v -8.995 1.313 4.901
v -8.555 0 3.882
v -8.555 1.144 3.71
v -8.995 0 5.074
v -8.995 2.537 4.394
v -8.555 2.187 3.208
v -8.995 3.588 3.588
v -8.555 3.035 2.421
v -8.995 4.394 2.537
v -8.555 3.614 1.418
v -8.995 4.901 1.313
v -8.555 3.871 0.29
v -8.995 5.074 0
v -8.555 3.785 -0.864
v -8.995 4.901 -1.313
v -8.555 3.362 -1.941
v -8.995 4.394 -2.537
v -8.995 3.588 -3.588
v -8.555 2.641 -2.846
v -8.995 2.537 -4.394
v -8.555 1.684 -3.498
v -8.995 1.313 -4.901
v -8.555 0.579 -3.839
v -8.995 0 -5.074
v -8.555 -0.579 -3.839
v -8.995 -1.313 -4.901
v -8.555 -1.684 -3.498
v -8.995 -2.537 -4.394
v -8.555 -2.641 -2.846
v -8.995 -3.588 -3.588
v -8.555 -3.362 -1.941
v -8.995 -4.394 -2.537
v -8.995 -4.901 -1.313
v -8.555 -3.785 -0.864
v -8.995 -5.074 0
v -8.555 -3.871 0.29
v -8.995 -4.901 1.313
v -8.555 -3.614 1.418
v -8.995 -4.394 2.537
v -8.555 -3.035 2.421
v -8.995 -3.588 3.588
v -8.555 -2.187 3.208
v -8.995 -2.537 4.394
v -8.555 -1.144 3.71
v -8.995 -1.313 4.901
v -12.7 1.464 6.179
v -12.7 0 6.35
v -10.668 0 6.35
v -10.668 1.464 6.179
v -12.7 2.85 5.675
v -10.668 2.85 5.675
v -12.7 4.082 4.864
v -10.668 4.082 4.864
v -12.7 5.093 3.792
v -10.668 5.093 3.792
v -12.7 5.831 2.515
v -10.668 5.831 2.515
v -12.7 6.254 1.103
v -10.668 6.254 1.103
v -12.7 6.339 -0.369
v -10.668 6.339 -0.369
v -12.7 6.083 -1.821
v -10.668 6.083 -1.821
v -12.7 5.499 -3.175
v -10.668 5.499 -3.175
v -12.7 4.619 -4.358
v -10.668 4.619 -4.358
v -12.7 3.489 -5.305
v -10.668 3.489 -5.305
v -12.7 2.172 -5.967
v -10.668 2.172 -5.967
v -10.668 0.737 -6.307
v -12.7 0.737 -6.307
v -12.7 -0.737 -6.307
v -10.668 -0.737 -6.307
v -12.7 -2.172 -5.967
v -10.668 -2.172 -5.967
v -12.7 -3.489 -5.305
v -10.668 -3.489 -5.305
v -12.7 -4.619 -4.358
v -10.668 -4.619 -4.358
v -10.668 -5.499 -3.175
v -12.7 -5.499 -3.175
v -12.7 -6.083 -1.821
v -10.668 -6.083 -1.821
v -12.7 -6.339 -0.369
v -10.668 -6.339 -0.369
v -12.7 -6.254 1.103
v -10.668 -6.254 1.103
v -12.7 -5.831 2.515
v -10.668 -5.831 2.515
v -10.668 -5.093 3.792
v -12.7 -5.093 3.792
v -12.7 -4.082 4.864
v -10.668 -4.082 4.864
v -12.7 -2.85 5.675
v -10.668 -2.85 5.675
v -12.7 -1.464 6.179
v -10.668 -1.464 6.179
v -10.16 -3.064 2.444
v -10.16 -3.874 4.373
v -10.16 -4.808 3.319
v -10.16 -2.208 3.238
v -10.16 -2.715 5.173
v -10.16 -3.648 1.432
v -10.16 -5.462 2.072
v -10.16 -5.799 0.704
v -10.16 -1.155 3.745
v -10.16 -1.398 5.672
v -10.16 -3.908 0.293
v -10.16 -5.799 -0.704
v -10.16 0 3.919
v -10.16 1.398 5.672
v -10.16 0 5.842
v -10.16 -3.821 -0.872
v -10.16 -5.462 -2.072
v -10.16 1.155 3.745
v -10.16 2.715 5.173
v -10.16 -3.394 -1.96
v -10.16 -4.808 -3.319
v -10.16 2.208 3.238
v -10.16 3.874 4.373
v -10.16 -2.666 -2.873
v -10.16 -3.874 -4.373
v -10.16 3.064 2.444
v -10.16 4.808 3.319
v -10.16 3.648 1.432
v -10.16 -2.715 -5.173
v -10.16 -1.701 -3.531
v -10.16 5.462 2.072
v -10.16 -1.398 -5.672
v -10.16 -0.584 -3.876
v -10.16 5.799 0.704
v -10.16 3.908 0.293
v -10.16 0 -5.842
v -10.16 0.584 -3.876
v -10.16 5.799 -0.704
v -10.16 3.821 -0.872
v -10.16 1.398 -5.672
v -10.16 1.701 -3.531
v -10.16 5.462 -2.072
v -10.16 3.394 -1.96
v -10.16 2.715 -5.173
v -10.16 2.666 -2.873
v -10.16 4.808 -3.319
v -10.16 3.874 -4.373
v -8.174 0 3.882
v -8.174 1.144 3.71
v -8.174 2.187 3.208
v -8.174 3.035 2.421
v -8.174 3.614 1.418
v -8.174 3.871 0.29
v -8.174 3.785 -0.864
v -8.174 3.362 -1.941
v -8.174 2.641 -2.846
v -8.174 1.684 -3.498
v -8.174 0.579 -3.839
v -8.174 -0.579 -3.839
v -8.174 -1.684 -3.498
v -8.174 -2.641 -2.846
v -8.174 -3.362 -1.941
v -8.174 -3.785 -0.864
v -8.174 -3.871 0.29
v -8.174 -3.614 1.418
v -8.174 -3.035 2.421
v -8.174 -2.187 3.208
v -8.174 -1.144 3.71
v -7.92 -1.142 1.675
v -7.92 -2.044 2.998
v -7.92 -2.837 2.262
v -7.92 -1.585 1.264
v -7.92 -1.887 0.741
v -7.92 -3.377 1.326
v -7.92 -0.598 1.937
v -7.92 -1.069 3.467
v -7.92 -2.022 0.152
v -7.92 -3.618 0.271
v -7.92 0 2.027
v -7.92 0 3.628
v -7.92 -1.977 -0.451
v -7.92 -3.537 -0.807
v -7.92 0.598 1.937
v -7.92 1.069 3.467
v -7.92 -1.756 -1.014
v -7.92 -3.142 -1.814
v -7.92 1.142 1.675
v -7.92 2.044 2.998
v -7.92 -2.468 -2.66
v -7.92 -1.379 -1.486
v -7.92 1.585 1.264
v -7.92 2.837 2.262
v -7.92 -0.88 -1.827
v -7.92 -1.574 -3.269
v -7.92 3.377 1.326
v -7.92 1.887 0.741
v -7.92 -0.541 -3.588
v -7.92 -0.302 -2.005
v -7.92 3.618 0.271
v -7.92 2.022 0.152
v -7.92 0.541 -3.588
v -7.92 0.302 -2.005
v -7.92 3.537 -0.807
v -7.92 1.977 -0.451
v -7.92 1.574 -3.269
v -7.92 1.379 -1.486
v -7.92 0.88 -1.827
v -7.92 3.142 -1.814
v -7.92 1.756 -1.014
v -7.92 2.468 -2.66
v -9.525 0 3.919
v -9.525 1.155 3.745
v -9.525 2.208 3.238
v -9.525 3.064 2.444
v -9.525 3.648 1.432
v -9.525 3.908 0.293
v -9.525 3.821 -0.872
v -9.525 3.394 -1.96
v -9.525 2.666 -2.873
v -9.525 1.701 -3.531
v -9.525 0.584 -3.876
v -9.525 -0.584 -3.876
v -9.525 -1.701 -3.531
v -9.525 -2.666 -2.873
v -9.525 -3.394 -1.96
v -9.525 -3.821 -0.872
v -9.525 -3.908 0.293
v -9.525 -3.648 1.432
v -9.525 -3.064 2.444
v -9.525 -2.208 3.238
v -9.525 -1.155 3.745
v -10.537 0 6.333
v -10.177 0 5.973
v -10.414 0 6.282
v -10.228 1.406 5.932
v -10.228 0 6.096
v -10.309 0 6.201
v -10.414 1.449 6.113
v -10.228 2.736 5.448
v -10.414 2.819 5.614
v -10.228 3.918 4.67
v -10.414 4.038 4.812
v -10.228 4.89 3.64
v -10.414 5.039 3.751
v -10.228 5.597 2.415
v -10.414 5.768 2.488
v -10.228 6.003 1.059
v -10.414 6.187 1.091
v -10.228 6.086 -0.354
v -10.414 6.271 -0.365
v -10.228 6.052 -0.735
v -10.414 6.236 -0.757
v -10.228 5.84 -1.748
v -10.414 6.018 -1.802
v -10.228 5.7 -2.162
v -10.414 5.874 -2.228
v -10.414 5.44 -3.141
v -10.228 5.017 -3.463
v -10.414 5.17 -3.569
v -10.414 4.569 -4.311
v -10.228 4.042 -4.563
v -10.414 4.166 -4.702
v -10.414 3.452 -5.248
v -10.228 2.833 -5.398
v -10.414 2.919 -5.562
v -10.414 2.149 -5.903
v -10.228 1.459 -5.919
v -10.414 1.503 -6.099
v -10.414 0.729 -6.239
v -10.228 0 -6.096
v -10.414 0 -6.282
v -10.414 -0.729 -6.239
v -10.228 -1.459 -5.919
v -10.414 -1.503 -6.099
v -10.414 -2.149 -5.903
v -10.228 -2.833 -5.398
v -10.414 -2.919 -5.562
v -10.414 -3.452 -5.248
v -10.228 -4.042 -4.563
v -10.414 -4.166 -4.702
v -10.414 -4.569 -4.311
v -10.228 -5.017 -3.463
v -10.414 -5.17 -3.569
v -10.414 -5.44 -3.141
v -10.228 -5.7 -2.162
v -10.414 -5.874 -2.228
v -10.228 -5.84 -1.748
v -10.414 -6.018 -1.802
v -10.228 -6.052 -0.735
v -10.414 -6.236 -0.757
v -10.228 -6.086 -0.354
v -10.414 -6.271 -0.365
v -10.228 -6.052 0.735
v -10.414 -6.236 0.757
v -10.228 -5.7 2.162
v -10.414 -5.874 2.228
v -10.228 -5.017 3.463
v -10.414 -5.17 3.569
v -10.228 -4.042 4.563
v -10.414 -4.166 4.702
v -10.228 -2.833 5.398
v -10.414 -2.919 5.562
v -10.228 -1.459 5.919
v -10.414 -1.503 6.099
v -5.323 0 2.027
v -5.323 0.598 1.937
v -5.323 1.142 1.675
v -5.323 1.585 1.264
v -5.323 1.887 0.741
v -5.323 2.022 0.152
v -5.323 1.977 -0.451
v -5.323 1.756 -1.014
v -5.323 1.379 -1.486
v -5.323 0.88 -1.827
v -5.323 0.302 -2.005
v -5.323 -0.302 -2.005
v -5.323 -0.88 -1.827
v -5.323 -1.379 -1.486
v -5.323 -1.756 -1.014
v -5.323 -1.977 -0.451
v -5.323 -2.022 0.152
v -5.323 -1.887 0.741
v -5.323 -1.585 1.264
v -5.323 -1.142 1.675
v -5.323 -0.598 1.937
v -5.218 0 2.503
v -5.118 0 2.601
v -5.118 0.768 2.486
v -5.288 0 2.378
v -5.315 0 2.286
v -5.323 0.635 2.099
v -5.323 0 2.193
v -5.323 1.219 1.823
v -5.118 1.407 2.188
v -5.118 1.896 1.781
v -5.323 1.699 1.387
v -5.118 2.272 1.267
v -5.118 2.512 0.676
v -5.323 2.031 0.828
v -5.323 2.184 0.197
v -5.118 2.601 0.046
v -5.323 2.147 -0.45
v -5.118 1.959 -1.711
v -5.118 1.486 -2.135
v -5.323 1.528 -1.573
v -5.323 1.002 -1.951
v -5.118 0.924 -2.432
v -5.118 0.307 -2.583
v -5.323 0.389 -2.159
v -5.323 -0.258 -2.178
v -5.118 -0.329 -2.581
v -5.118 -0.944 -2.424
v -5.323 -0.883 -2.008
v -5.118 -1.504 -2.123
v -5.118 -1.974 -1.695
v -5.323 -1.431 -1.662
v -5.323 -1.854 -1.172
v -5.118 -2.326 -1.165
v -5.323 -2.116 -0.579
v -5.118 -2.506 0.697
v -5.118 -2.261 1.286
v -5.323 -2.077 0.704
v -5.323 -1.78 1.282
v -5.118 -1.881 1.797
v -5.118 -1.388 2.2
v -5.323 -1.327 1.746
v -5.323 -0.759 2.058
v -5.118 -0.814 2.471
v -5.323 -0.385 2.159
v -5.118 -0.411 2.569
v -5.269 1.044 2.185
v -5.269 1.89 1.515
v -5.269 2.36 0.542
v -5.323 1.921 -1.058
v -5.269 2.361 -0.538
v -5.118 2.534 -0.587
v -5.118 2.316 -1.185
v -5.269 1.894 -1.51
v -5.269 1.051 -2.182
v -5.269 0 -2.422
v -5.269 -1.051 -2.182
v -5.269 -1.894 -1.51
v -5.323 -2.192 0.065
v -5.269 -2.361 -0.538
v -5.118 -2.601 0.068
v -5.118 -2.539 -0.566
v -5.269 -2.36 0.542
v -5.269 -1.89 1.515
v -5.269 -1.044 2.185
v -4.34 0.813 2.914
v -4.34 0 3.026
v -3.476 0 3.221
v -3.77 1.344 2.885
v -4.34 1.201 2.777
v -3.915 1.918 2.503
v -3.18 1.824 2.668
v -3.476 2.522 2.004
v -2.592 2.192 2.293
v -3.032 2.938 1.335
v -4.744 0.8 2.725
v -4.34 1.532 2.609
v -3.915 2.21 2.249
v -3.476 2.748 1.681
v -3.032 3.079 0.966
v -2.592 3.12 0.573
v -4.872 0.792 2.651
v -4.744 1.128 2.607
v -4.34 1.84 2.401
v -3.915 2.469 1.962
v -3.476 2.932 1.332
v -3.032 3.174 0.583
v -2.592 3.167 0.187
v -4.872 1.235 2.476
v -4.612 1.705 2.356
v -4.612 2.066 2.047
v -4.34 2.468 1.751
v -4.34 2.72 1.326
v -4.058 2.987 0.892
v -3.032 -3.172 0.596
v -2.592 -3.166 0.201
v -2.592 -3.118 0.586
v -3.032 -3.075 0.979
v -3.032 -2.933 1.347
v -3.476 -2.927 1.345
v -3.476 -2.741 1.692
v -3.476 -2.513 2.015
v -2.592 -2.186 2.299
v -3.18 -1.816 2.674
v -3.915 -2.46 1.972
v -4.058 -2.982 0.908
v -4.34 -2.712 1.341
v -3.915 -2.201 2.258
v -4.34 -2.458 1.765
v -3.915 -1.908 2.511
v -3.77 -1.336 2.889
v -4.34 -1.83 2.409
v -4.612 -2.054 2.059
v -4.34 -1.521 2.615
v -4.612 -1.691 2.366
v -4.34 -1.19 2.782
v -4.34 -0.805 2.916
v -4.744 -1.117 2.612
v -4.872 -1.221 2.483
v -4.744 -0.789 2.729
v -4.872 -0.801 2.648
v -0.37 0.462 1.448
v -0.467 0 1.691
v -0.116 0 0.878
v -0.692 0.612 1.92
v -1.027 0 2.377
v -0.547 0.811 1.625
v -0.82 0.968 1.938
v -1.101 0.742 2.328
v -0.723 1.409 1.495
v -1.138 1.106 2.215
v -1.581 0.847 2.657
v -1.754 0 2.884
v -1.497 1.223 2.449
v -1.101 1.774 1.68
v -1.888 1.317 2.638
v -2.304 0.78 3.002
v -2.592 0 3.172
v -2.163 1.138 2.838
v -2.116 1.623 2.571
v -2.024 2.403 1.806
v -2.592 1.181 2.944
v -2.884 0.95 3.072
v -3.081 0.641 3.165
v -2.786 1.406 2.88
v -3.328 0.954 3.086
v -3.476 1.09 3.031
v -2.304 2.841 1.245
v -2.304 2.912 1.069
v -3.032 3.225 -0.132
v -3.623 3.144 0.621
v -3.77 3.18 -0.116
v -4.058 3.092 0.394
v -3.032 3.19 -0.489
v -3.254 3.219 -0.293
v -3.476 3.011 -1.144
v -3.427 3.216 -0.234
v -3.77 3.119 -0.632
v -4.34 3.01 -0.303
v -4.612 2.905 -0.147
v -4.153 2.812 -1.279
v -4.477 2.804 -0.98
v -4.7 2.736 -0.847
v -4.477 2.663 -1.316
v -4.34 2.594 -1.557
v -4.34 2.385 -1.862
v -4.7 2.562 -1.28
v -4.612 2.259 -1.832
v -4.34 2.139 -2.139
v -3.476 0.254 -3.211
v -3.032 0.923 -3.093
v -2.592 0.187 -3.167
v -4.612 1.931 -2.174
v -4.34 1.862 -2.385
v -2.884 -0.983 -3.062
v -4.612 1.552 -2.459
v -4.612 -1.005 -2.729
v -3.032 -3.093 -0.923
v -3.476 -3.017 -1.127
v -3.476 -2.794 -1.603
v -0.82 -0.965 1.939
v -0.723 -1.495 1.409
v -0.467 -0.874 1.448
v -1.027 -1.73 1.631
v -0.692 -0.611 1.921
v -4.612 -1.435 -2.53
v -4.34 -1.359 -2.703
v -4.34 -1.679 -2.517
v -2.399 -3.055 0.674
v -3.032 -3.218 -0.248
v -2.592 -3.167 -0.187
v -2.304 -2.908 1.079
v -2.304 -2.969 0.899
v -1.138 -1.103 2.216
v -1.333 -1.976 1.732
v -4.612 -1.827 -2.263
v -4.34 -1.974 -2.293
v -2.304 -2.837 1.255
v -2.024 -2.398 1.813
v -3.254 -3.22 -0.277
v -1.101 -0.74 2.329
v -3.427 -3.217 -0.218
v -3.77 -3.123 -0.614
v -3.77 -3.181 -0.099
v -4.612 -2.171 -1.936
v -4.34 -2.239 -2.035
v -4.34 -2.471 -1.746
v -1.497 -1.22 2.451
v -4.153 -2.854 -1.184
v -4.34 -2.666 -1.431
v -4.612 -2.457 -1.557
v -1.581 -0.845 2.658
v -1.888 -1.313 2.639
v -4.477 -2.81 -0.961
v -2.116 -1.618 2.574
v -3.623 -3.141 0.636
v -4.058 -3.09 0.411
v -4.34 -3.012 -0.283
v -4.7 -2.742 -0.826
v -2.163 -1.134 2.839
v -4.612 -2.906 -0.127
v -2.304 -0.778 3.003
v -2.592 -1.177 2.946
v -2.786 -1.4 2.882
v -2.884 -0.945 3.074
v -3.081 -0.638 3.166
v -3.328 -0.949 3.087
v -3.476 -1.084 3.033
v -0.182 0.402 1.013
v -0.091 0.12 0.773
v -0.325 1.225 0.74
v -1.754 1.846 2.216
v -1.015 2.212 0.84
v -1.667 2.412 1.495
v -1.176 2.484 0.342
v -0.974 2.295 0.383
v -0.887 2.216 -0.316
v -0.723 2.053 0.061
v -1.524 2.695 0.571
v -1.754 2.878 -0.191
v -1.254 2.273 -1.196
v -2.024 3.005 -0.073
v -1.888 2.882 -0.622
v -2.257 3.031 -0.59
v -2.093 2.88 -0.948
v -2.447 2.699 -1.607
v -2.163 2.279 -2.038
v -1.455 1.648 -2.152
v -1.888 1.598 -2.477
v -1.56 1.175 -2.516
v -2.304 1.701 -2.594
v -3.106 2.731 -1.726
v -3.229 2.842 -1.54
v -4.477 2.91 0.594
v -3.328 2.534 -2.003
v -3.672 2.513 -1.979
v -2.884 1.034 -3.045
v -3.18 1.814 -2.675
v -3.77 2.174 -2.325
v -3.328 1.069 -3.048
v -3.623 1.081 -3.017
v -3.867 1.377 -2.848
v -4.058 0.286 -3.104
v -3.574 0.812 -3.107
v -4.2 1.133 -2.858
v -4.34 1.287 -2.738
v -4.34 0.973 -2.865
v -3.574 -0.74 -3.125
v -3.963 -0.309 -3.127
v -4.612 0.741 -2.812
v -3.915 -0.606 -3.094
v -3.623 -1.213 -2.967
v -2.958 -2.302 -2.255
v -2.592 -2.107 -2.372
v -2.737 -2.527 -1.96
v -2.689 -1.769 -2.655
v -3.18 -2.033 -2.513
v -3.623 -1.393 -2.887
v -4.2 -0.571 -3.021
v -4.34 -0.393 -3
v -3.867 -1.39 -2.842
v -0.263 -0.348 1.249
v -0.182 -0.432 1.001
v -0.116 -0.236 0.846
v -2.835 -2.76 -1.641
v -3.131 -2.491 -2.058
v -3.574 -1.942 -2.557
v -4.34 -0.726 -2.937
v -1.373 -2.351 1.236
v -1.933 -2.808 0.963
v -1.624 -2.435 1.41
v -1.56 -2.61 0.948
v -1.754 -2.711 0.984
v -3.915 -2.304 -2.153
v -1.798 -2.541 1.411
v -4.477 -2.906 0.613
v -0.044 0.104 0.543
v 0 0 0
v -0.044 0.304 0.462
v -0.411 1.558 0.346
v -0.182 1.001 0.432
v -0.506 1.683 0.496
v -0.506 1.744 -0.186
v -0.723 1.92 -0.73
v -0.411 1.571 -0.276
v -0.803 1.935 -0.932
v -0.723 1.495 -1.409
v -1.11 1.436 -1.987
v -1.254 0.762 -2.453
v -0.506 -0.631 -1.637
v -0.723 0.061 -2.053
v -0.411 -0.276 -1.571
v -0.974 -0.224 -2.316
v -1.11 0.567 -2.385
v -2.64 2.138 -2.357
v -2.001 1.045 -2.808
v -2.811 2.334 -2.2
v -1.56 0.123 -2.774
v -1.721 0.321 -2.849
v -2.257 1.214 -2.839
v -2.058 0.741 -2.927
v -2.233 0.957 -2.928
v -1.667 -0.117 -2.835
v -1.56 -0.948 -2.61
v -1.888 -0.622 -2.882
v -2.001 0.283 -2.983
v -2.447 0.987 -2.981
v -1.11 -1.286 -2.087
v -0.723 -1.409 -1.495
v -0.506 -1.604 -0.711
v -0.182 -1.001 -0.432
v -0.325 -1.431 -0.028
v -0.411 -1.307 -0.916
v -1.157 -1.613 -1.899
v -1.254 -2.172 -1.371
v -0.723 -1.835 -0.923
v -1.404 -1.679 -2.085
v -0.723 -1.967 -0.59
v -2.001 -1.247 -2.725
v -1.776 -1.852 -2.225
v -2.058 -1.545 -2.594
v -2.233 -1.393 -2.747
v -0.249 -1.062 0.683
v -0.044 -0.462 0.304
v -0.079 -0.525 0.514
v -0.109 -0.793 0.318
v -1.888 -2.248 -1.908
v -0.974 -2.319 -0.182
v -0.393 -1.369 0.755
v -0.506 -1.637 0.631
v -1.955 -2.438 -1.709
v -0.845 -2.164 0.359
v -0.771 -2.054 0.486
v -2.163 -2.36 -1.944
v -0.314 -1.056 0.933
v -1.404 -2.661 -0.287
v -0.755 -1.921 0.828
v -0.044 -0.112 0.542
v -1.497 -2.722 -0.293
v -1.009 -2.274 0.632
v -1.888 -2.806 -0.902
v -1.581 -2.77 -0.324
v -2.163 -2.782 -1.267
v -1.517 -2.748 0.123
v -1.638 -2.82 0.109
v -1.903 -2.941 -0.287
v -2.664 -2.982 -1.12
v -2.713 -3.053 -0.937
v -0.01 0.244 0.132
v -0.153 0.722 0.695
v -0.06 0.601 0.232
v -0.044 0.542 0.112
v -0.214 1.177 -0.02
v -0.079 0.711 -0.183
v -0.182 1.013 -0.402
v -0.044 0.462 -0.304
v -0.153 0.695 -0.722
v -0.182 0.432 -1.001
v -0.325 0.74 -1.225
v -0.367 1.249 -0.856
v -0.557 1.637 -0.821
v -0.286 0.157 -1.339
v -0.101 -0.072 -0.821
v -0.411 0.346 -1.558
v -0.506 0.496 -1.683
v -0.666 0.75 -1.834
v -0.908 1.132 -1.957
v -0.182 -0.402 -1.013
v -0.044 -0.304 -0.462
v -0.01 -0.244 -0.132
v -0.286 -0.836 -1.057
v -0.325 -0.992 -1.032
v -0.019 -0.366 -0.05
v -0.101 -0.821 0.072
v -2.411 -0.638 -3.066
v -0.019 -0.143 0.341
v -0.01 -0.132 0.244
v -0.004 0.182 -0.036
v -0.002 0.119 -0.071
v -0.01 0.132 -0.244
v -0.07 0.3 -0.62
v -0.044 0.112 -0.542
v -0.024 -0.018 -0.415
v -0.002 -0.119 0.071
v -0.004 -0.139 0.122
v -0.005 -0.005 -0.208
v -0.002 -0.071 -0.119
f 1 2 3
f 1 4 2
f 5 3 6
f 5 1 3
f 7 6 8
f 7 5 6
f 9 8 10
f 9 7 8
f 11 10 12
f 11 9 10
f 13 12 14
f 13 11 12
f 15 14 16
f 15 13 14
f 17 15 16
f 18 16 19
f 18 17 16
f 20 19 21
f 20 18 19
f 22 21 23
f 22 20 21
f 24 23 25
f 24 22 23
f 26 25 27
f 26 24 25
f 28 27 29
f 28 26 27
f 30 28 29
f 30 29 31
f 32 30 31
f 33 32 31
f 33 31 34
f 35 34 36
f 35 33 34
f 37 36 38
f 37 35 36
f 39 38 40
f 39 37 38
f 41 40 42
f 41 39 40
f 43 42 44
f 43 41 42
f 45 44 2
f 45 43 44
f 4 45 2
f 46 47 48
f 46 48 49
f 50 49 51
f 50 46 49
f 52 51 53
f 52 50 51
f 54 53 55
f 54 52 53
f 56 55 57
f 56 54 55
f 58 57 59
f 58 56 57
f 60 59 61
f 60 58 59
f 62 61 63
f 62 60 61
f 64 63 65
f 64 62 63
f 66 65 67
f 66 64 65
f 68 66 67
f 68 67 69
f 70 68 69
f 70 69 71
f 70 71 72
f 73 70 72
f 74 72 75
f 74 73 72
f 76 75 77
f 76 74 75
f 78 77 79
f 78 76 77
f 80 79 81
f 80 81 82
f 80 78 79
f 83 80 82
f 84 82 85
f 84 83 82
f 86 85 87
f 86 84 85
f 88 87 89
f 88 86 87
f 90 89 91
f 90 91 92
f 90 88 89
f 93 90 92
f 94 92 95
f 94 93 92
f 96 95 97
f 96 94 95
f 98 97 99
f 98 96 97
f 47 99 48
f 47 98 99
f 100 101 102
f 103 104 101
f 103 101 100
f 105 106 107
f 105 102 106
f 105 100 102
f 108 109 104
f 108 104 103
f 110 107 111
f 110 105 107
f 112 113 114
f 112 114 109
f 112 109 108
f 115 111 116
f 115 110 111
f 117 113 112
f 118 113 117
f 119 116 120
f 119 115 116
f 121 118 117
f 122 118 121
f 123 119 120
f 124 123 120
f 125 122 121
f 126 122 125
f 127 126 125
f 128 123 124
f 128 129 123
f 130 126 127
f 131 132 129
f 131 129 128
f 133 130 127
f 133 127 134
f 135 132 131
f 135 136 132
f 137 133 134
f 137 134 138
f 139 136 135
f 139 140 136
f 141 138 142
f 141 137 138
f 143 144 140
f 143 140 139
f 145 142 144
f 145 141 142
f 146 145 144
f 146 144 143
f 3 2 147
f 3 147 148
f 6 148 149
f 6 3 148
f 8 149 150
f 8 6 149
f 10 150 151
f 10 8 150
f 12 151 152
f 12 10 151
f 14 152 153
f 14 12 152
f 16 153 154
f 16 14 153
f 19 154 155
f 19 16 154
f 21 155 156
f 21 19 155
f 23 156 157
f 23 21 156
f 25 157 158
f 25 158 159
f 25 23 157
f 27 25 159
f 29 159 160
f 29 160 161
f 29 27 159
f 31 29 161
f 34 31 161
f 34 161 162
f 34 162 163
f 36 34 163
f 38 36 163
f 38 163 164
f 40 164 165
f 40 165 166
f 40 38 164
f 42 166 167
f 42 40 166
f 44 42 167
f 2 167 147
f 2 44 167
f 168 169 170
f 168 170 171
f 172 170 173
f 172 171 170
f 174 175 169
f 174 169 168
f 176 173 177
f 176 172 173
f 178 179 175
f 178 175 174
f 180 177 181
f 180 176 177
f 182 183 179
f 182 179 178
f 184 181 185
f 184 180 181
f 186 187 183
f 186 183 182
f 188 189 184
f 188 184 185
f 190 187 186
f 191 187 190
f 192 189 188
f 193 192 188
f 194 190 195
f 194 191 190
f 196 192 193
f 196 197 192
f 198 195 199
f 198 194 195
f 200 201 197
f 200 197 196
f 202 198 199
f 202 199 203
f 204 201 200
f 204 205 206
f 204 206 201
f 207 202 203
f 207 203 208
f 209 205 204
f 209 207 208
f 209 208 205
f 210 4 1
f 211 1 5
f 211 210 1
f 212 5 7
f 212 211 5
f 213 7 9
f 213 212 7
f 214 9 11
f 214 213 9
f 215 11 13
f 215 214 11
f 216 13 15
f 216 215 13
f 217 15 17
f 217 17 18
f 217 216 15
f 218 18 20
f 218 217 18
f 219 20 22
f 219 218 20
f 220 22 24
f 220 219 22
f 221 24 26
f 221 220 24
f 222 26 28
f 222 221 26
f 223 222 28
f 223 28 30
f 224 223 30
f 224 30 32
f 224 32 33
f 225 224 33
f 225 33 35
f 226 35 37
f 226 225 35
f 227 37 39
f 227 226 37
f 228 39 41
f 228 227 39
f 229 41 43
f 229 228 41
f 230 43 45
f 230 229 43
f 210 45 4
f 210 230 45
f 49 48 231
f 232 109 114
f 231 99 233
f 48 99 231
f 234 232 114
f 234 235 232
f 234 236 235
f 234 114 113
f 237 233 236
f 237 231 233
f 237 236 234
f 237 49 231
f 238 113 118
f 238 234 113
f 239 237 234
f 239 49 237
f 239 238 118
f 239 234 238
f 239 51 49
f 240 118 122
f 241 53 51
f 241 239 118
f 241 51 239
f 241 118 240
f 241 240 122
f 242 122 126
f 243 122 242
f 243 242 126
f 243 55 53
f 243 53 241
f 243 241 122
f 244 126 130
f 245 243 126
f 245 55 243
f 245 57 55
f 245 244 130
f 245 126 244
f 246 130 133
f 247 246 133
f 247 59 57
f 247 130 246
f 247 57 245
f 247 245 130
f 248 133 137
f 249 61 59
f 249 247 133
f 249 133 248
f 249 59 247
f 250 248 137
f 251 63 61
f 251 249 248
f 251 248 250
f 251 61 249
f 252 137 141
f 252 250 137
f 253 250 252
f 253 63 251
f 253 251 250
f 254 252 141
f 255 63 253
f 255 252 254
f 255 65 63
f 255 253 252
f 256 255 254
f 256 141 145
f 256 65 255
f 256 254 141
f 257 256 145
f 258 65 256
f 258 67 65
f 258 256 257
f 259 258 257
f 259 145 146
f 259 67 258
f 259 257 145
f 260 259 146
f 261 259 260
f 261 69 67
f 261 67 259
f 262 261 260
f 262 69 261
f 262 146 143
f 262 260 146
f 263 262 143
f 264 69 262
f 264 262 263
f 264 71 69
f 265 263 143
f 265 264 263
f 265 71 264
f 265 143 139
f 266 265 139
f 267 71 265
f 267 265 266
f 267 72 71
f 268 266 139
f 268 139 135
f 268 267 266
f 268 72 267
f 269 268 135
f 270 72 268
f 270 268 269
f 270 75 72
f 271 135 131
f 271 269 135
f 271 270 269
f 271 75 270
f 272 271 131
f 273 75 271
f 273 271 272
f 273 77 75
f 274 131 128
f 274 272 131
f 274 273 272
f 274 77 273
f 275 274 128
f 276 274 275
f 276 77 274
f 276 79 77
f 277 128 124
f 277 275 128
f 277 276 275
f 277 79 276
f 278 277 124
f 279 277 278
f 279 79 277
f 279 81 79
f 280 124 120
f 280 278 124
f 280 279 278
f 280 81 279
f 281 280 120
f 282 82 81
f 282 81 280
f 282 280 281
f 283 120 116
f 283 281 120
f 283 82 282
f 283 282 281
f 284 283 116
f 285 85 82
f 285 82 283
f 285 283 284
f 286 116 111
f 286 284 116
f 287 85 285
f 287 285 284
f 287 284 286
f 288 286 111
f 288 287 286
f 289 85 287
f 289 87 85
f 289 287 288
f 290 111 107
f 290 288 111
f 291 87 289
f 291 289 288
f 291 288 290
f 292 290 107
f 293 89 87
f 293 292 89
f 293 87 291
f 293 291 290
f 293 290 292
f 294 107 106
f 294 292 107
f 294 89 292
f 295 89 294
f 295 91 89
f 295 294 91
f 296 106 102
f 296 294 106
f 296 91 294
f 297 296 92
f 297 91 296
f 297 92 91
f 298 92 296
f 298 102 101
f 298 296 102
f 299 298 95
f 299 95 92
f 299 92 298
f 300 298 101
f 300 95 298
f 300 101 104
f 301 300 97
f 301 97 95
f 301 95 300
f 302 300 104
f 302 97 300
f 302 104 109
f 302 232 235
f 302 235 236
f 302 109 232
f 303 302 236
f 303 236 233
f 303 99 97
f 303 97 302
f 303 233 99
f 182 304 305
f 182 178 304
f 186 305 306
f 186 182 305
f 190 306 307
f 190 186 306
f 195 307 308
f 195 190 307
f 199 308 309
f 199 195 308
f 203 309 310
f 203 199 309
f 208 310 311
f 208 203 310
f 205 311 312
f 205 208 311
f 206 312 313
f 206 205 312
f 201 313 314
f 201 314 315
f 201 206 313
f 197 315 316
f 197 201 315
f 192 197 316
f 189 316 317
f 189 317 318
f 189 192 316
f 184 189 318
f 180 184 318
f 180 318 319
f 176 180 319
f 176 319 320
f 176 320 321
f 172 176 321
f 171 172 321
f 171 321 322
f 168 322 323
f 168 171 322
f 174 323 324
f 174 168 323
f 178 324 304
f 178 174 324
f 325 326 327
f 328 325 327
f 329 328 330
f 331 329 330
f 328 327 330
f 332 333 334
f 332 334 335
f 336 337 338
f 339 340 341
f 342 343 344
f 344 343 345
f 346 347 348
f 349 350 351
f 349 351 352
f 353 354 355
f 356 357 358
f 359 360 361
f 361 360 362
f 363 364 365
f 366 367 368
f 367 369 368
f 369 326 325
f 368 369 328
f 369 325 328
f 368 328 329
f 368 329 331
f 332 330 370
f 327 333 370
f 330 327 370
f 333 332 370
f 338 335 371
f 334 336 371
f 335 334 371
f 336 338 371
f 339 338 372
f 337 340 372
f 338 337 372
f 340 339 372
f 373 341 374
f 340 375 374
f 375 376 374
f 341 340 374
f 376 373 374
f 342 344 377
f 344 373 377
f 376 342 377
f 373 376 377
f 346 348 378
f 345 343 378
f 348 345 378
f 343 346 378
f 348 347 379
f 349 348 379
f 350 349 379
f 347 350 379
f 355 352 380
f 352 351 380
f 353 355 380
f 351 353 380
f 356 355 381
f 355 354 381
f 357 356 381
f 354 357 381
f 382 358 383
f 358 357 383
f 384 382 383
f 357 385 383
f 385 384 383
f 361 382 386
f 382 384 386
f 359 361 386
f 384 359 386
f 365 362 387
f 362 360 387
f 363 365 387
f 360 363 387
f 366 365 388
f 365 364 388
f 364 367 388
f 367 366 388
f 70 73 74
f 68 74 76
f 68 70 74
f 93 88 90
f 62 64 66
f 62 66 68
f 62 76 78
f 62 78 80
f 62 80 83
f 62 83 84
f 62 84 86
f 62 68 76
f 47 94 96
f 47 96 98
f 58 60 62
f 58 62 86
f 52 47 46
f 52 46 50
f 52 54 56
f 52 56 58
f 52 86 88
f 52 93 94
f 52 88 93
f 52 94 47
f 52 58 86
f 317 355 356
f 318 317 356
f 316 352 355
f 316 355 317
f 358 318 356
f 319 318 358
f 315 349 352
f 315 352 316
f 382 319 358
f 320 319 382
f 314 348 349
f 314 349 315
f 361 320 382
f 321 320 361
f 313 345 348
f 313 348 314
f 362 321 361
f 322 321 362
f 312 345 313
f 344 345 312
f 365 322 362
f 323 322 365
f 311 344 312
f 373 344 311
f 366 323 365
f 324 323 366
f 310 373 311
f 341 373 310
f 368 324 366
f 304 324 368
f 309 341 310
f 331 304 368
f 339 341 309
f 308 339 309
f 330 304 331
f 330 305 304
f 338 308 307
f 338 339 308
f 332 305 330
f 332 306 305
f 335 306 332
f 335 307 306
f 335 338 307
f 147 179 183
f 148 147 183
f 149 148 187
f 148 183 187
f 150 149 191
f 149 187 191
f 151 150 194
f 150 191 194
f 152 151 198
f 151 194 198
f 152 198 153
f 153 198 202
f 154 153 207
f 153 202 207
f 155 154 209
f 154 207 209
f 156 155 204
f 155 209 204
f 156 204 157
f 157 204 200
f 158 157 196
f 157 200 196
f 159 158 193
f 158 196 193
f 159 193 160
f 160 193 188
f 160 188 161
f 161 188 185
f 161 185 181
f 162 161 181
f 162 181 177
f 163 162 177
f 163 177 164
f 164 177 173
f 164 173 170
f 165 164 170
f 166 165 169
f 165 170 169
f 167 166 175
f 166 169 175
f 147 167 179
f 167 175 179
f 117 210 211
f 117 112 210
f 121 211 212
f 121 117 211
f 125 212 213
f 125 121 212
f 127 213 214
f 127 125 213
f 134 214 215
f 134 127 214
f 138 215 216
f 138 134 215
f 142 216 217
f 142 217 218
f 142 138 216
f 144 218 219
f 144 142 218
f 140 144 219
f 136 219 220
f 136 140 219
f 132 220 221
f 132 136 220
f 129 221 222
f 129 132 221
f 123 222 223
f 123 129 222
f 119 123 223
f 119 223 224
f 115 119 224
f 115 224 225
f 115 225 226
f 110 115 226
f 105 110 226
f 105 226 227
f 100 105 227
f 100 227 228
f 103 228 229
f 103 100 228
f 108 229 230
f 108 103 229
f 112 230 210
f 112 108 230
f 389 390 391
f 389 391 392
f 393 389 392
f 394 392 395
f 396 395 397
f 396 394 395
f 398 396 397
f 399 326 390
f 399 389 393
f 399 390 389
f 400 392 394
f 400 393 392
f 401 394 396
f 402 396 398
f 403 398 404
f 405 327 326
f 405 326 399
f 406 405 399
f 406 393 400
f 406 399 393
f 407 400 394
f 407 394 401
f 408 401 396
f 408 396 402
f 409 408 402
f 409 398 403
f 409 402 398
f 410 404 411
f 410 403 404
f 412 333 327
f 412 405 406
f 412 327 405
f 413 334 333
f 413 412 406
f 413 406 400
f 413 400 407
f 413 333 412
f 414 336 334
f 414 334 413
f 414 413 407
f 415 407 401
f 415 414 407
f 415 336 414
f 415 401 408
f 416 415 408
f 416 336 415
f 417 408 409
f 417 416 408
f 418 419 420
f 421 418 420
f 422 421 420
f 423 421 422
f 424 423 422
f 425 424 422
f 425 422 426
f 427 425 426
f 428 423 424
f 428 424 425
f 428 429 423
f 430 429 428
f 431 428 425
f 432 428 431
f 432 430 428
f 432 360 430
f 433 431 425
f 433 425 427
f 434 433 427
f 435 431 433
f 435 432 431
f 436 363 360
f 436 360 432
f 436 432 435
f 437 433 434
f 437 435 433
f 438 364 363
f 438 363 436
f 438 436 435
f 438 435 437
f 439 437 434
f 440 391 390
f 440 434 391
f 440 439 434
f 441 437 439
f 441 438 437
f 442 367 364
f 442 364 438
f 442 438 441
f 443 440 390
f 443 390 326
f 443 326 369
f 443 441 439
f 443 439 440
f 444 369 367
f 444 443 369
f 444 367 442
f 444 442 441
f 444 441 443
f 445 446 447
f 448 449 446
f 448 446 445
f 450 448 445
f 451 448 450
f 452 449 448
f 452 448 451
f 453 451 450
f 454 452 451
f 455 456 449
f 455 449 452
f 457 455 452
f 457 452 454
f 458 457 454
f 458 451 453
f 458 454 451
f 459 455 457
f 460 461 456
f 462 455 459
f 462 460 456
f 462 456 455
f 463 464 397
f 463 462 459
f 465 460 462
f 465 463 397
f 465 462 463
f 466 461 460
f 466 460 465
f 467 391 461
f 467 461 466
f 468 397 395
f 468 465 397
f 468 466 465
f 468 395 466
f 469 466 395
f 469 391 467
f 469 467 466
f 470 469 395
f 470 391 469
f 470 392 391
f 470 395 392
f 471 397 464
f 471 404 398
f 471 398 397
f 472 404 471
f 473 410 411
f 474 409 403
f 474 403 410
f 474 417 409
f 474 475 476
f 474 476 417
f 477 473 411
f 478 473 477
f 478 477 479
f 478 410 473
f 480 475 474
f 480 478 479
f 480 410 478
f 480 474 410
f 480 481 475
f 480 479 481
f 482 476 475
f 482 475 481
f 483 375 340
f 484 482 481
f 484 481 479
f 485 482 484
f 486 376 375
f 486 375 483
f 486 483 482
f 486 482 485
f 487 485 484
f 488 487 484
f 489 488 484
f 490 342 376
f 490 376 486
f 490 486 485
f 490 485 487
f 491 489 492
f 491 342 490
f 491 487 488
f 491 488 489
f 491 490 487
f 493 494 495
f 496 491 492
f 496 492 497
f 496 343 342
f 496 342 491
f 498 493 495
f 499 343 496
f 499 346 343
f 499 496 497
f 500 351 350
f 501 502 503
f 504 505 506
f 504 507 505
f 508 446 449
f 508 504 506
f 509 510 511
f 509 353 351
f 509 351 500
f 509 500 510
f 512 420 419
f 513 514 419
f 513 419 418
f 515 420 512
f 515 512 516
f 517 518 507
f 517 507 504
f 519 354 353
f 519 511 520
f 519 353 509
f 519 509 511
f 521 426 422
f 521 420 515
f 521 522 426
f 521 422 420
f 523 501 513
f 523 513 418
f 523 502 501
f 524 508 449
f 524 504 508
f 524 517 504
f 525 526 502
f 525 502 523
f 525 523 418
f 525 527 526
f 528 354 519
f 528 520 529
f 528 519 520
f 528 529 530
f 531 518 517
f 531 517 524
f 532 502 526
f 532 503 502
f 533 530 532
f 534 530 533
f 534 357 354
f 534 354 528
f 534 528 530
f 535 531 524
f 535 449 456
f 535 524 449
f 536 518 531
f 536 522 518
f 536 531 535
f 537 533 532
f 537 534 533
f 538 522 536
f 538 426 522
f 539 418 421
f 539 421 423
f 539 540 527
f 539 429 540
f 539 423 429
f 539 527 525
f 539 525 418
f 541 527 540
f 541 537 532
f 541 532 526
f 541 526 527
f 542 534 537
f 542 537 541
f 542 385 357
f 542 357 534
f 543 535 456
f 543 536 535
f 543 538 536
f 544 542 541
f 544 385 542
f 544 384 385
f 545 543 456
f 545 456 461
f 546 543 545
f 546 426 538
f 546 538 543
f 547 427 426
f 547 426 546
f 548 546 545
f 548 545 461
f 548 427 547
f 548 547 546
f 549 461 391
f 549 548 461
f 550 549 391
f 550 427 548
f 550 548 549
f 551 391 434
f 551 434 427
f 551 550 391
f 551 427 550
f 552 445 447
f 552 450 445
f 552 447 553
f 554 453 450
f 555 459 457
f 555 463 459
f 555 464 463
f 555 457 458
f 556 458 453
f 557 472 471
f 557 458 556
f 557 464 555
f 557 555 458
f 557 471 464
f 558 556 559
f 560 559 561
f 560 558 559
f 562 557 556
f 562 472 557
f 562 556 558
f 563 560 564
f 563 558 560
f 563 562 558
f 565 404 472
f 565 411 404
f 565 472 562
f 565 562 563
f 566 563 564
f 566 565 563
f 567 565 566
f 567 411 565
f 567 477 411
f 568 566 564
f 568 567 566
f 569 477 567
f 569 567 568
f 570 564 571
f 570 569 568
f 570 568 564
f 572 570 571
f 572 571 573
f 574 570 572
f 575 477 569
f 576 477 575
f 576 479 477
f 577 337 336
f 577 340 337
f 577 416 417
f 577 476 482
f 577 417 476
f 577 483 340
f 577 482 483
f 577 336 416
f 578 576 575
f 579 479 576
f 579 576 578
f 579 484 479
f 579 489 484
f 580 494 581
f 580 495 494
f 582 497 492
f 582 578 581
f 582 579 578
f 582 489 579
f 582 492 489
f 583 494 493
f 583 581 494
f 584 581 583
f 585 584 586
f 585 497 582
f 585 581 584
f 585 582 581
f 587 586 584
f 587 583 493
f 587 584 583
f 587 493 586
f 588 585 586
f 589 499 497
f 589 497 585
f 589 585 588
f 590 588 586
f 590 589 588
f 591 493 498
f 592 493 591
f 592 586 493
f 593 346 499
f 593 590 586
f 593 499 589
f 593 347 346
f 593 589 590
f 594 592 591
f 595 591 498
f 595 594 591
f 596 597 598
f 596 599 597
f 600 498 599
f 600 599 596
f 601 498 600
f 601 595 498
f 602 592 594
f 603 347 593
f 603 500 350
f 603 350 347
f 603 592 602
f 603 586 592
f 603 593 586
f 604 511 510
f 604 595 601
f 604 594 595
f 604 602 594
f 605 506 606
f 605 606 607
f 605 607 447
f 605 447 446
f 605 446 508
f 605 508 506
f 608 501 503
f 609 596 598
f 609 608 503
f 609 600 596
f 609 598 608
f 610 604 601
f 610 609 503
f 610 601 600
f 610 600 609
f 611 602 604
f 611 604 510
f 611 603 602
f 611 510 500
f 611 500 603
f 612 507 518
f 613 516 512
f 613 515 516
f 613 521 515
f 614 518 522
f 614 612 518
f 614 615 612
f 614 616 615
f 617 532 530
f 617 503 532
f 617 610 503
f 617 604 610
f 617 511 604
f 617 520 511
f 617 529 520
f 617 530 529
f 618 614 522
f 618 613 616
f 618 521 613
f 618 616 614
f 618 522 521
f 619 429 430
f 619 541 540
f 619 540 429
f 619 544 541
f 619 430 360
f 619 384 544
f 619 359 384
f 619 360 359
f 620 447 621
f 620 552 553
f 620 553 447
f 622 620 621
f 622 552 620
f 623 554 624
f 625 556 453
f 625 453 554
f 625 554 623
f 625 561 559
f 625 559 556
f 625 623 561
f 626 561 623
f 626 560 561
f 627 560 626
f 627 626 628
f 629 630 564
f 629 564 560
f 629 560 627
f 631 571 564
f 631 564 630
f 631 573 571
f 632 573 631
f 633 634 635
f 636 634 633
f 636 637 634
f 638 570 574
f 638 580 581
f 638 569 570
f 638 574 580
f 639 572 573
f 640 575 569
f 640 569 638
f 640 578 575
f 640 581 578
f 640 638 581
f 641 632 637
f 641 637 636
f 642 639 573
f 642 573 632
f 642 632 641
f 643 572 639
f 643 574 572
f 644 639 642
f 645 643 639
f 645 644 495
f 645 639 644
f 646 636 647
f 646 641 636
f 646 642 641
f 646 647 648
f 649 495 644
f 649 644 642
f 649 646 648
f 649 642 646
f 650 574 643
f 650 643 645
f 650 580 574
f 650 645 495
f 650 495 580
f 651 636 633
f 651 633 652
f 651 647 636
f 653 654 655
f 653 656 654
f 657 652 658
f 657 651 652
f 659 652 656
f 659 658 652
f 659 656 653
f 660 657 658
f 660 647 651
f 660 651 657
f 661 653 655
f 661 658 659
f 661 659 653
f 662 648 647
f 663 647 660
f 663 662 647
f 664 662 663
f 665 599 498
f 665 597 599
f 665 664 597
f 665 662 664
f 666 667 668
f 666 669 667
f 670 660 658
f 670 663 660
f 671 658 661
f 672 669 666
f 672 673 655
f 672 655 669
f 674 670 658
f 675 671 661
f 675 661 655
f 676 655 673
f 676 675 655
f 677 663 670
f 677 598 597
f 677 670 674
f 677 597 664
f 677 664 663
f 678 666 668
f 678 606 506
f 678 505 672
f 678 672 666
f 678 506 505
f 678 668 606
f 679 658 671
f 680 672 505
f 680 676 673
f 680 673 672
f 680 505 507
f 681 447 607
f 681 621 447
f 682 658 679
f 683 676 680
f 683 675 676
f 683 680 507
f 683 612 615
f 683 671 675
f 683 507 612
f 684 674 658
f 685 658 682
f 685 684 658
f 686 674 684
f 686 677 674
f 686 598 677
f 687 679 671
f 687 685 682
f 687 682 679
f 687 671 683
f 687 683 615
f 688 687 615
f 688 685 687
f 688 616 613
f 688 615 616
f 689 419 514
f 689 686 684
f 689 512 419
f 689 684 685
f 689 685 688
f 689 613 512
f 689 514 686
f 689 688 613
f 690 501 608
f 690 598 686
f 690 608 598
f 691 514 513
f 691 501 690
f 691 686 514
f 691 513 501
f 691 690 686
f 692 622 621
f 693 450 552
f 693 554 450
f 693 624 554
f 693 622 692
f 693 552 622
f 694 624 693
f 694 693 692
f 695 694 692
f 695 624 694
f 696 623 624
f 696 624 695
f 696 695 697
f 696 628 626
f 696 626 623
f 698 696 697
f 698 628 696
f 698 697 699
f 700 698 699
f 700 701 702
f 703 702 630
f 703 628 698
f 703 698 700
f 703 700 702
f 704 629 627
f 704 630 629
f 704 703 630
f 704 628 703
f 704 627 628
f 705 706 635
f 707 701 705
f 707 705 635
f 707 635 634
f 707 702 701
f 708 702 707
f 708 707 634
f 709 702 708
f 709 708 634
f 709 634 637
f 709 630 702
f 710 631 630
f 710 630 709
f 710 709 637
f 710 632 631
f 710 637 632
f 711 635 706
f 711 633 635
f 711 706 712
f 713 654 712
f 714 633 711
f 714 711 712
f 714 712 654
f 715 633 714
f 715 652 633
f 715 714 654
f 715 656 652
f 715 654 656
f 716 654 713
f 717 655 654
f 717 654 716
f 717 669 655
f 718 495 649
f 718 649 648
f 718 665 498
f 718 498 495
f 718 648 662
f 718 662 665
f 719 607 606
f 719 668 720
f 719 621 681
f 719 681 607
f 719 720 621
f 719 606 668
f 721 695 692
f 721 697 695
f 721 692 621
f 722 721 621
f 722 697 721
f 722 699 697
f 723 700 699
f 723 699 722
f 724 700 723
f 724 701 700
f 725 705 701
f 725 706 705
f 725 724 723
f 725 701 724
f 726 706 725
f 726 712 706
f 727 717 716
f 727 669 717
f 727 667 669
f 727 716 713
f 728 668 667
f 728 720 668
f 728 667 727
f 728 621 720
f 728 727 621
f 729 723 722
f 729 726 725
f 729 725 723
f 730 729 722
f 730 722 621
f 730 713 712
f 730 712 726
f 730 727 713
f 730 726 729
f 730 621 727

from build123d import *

# Parameters (mm, degrees)
F2_R    = 0.508
F3_R    = 0.508
F4_SIZE = 0.254


with BuildPart() as f1:
    # F0 (on Front) → F1 (revolve)
    with BuildSketch(Plane.XZ):
        with BuildLine():
            Line((-12.7, 0), (0, 0))
            ThreePointArc((0, 0), (-1.872948, 2.941347), (-5.323115, 2.435581))
            Line((-5.323115, 2.435581), (-5.323115, 2.027367))
            Line((-5.323115, 2.027367), (-7.920302, 2.027367))
            Line((-7.920302, 2.027367), (-7.920302, 2.435581))
            Line((-7.920302, 2.435581), (-7.920302, 3.882198))
            Line((-7.920302, 3.882198), (-8.555302, 3.882198))
            Line((-8.555302, 3.882198), (-8.995197, 5.073581))
            Line((-8.995197, 5.073581), (-9.525, 3.919367))
            Line((-9.525, 3.919367), (-10.16, 3.919367))
            Line((-10.16, 3.919367), (-10.16, 6.35))
            Line((-10.16, 6.35), (-12.7, 6.35))
            Line((-12.7, 6.35), (-12.7, 0))
        make_face()
    revolve(axis=Axis((-6.35, 0, 0), (-1, 0, 0)))

    # F2
    f2_edges = [f1.edges().sort_by_distance(p)[0] for p in [
        (-5.323115, 0, -2.435581),
    ]]
    fillet(f2_edges, radius=F2_R)

    # F3
    f3_edges = [f1.edges().sort_by_distance(p)[0] for p in [
        (-10.16, 0, -6.35),
    ]]
    fillet(f3_edges, radius=F3_R)

    # F4
    f4_edges = [f1.edges().sort_by_distance(p)[0] for p in [
        (-7.920302, 0, -3.882198),
    ]]
    chamfer(f4_edges, length=F4_SIZE)


solid = f1.part
